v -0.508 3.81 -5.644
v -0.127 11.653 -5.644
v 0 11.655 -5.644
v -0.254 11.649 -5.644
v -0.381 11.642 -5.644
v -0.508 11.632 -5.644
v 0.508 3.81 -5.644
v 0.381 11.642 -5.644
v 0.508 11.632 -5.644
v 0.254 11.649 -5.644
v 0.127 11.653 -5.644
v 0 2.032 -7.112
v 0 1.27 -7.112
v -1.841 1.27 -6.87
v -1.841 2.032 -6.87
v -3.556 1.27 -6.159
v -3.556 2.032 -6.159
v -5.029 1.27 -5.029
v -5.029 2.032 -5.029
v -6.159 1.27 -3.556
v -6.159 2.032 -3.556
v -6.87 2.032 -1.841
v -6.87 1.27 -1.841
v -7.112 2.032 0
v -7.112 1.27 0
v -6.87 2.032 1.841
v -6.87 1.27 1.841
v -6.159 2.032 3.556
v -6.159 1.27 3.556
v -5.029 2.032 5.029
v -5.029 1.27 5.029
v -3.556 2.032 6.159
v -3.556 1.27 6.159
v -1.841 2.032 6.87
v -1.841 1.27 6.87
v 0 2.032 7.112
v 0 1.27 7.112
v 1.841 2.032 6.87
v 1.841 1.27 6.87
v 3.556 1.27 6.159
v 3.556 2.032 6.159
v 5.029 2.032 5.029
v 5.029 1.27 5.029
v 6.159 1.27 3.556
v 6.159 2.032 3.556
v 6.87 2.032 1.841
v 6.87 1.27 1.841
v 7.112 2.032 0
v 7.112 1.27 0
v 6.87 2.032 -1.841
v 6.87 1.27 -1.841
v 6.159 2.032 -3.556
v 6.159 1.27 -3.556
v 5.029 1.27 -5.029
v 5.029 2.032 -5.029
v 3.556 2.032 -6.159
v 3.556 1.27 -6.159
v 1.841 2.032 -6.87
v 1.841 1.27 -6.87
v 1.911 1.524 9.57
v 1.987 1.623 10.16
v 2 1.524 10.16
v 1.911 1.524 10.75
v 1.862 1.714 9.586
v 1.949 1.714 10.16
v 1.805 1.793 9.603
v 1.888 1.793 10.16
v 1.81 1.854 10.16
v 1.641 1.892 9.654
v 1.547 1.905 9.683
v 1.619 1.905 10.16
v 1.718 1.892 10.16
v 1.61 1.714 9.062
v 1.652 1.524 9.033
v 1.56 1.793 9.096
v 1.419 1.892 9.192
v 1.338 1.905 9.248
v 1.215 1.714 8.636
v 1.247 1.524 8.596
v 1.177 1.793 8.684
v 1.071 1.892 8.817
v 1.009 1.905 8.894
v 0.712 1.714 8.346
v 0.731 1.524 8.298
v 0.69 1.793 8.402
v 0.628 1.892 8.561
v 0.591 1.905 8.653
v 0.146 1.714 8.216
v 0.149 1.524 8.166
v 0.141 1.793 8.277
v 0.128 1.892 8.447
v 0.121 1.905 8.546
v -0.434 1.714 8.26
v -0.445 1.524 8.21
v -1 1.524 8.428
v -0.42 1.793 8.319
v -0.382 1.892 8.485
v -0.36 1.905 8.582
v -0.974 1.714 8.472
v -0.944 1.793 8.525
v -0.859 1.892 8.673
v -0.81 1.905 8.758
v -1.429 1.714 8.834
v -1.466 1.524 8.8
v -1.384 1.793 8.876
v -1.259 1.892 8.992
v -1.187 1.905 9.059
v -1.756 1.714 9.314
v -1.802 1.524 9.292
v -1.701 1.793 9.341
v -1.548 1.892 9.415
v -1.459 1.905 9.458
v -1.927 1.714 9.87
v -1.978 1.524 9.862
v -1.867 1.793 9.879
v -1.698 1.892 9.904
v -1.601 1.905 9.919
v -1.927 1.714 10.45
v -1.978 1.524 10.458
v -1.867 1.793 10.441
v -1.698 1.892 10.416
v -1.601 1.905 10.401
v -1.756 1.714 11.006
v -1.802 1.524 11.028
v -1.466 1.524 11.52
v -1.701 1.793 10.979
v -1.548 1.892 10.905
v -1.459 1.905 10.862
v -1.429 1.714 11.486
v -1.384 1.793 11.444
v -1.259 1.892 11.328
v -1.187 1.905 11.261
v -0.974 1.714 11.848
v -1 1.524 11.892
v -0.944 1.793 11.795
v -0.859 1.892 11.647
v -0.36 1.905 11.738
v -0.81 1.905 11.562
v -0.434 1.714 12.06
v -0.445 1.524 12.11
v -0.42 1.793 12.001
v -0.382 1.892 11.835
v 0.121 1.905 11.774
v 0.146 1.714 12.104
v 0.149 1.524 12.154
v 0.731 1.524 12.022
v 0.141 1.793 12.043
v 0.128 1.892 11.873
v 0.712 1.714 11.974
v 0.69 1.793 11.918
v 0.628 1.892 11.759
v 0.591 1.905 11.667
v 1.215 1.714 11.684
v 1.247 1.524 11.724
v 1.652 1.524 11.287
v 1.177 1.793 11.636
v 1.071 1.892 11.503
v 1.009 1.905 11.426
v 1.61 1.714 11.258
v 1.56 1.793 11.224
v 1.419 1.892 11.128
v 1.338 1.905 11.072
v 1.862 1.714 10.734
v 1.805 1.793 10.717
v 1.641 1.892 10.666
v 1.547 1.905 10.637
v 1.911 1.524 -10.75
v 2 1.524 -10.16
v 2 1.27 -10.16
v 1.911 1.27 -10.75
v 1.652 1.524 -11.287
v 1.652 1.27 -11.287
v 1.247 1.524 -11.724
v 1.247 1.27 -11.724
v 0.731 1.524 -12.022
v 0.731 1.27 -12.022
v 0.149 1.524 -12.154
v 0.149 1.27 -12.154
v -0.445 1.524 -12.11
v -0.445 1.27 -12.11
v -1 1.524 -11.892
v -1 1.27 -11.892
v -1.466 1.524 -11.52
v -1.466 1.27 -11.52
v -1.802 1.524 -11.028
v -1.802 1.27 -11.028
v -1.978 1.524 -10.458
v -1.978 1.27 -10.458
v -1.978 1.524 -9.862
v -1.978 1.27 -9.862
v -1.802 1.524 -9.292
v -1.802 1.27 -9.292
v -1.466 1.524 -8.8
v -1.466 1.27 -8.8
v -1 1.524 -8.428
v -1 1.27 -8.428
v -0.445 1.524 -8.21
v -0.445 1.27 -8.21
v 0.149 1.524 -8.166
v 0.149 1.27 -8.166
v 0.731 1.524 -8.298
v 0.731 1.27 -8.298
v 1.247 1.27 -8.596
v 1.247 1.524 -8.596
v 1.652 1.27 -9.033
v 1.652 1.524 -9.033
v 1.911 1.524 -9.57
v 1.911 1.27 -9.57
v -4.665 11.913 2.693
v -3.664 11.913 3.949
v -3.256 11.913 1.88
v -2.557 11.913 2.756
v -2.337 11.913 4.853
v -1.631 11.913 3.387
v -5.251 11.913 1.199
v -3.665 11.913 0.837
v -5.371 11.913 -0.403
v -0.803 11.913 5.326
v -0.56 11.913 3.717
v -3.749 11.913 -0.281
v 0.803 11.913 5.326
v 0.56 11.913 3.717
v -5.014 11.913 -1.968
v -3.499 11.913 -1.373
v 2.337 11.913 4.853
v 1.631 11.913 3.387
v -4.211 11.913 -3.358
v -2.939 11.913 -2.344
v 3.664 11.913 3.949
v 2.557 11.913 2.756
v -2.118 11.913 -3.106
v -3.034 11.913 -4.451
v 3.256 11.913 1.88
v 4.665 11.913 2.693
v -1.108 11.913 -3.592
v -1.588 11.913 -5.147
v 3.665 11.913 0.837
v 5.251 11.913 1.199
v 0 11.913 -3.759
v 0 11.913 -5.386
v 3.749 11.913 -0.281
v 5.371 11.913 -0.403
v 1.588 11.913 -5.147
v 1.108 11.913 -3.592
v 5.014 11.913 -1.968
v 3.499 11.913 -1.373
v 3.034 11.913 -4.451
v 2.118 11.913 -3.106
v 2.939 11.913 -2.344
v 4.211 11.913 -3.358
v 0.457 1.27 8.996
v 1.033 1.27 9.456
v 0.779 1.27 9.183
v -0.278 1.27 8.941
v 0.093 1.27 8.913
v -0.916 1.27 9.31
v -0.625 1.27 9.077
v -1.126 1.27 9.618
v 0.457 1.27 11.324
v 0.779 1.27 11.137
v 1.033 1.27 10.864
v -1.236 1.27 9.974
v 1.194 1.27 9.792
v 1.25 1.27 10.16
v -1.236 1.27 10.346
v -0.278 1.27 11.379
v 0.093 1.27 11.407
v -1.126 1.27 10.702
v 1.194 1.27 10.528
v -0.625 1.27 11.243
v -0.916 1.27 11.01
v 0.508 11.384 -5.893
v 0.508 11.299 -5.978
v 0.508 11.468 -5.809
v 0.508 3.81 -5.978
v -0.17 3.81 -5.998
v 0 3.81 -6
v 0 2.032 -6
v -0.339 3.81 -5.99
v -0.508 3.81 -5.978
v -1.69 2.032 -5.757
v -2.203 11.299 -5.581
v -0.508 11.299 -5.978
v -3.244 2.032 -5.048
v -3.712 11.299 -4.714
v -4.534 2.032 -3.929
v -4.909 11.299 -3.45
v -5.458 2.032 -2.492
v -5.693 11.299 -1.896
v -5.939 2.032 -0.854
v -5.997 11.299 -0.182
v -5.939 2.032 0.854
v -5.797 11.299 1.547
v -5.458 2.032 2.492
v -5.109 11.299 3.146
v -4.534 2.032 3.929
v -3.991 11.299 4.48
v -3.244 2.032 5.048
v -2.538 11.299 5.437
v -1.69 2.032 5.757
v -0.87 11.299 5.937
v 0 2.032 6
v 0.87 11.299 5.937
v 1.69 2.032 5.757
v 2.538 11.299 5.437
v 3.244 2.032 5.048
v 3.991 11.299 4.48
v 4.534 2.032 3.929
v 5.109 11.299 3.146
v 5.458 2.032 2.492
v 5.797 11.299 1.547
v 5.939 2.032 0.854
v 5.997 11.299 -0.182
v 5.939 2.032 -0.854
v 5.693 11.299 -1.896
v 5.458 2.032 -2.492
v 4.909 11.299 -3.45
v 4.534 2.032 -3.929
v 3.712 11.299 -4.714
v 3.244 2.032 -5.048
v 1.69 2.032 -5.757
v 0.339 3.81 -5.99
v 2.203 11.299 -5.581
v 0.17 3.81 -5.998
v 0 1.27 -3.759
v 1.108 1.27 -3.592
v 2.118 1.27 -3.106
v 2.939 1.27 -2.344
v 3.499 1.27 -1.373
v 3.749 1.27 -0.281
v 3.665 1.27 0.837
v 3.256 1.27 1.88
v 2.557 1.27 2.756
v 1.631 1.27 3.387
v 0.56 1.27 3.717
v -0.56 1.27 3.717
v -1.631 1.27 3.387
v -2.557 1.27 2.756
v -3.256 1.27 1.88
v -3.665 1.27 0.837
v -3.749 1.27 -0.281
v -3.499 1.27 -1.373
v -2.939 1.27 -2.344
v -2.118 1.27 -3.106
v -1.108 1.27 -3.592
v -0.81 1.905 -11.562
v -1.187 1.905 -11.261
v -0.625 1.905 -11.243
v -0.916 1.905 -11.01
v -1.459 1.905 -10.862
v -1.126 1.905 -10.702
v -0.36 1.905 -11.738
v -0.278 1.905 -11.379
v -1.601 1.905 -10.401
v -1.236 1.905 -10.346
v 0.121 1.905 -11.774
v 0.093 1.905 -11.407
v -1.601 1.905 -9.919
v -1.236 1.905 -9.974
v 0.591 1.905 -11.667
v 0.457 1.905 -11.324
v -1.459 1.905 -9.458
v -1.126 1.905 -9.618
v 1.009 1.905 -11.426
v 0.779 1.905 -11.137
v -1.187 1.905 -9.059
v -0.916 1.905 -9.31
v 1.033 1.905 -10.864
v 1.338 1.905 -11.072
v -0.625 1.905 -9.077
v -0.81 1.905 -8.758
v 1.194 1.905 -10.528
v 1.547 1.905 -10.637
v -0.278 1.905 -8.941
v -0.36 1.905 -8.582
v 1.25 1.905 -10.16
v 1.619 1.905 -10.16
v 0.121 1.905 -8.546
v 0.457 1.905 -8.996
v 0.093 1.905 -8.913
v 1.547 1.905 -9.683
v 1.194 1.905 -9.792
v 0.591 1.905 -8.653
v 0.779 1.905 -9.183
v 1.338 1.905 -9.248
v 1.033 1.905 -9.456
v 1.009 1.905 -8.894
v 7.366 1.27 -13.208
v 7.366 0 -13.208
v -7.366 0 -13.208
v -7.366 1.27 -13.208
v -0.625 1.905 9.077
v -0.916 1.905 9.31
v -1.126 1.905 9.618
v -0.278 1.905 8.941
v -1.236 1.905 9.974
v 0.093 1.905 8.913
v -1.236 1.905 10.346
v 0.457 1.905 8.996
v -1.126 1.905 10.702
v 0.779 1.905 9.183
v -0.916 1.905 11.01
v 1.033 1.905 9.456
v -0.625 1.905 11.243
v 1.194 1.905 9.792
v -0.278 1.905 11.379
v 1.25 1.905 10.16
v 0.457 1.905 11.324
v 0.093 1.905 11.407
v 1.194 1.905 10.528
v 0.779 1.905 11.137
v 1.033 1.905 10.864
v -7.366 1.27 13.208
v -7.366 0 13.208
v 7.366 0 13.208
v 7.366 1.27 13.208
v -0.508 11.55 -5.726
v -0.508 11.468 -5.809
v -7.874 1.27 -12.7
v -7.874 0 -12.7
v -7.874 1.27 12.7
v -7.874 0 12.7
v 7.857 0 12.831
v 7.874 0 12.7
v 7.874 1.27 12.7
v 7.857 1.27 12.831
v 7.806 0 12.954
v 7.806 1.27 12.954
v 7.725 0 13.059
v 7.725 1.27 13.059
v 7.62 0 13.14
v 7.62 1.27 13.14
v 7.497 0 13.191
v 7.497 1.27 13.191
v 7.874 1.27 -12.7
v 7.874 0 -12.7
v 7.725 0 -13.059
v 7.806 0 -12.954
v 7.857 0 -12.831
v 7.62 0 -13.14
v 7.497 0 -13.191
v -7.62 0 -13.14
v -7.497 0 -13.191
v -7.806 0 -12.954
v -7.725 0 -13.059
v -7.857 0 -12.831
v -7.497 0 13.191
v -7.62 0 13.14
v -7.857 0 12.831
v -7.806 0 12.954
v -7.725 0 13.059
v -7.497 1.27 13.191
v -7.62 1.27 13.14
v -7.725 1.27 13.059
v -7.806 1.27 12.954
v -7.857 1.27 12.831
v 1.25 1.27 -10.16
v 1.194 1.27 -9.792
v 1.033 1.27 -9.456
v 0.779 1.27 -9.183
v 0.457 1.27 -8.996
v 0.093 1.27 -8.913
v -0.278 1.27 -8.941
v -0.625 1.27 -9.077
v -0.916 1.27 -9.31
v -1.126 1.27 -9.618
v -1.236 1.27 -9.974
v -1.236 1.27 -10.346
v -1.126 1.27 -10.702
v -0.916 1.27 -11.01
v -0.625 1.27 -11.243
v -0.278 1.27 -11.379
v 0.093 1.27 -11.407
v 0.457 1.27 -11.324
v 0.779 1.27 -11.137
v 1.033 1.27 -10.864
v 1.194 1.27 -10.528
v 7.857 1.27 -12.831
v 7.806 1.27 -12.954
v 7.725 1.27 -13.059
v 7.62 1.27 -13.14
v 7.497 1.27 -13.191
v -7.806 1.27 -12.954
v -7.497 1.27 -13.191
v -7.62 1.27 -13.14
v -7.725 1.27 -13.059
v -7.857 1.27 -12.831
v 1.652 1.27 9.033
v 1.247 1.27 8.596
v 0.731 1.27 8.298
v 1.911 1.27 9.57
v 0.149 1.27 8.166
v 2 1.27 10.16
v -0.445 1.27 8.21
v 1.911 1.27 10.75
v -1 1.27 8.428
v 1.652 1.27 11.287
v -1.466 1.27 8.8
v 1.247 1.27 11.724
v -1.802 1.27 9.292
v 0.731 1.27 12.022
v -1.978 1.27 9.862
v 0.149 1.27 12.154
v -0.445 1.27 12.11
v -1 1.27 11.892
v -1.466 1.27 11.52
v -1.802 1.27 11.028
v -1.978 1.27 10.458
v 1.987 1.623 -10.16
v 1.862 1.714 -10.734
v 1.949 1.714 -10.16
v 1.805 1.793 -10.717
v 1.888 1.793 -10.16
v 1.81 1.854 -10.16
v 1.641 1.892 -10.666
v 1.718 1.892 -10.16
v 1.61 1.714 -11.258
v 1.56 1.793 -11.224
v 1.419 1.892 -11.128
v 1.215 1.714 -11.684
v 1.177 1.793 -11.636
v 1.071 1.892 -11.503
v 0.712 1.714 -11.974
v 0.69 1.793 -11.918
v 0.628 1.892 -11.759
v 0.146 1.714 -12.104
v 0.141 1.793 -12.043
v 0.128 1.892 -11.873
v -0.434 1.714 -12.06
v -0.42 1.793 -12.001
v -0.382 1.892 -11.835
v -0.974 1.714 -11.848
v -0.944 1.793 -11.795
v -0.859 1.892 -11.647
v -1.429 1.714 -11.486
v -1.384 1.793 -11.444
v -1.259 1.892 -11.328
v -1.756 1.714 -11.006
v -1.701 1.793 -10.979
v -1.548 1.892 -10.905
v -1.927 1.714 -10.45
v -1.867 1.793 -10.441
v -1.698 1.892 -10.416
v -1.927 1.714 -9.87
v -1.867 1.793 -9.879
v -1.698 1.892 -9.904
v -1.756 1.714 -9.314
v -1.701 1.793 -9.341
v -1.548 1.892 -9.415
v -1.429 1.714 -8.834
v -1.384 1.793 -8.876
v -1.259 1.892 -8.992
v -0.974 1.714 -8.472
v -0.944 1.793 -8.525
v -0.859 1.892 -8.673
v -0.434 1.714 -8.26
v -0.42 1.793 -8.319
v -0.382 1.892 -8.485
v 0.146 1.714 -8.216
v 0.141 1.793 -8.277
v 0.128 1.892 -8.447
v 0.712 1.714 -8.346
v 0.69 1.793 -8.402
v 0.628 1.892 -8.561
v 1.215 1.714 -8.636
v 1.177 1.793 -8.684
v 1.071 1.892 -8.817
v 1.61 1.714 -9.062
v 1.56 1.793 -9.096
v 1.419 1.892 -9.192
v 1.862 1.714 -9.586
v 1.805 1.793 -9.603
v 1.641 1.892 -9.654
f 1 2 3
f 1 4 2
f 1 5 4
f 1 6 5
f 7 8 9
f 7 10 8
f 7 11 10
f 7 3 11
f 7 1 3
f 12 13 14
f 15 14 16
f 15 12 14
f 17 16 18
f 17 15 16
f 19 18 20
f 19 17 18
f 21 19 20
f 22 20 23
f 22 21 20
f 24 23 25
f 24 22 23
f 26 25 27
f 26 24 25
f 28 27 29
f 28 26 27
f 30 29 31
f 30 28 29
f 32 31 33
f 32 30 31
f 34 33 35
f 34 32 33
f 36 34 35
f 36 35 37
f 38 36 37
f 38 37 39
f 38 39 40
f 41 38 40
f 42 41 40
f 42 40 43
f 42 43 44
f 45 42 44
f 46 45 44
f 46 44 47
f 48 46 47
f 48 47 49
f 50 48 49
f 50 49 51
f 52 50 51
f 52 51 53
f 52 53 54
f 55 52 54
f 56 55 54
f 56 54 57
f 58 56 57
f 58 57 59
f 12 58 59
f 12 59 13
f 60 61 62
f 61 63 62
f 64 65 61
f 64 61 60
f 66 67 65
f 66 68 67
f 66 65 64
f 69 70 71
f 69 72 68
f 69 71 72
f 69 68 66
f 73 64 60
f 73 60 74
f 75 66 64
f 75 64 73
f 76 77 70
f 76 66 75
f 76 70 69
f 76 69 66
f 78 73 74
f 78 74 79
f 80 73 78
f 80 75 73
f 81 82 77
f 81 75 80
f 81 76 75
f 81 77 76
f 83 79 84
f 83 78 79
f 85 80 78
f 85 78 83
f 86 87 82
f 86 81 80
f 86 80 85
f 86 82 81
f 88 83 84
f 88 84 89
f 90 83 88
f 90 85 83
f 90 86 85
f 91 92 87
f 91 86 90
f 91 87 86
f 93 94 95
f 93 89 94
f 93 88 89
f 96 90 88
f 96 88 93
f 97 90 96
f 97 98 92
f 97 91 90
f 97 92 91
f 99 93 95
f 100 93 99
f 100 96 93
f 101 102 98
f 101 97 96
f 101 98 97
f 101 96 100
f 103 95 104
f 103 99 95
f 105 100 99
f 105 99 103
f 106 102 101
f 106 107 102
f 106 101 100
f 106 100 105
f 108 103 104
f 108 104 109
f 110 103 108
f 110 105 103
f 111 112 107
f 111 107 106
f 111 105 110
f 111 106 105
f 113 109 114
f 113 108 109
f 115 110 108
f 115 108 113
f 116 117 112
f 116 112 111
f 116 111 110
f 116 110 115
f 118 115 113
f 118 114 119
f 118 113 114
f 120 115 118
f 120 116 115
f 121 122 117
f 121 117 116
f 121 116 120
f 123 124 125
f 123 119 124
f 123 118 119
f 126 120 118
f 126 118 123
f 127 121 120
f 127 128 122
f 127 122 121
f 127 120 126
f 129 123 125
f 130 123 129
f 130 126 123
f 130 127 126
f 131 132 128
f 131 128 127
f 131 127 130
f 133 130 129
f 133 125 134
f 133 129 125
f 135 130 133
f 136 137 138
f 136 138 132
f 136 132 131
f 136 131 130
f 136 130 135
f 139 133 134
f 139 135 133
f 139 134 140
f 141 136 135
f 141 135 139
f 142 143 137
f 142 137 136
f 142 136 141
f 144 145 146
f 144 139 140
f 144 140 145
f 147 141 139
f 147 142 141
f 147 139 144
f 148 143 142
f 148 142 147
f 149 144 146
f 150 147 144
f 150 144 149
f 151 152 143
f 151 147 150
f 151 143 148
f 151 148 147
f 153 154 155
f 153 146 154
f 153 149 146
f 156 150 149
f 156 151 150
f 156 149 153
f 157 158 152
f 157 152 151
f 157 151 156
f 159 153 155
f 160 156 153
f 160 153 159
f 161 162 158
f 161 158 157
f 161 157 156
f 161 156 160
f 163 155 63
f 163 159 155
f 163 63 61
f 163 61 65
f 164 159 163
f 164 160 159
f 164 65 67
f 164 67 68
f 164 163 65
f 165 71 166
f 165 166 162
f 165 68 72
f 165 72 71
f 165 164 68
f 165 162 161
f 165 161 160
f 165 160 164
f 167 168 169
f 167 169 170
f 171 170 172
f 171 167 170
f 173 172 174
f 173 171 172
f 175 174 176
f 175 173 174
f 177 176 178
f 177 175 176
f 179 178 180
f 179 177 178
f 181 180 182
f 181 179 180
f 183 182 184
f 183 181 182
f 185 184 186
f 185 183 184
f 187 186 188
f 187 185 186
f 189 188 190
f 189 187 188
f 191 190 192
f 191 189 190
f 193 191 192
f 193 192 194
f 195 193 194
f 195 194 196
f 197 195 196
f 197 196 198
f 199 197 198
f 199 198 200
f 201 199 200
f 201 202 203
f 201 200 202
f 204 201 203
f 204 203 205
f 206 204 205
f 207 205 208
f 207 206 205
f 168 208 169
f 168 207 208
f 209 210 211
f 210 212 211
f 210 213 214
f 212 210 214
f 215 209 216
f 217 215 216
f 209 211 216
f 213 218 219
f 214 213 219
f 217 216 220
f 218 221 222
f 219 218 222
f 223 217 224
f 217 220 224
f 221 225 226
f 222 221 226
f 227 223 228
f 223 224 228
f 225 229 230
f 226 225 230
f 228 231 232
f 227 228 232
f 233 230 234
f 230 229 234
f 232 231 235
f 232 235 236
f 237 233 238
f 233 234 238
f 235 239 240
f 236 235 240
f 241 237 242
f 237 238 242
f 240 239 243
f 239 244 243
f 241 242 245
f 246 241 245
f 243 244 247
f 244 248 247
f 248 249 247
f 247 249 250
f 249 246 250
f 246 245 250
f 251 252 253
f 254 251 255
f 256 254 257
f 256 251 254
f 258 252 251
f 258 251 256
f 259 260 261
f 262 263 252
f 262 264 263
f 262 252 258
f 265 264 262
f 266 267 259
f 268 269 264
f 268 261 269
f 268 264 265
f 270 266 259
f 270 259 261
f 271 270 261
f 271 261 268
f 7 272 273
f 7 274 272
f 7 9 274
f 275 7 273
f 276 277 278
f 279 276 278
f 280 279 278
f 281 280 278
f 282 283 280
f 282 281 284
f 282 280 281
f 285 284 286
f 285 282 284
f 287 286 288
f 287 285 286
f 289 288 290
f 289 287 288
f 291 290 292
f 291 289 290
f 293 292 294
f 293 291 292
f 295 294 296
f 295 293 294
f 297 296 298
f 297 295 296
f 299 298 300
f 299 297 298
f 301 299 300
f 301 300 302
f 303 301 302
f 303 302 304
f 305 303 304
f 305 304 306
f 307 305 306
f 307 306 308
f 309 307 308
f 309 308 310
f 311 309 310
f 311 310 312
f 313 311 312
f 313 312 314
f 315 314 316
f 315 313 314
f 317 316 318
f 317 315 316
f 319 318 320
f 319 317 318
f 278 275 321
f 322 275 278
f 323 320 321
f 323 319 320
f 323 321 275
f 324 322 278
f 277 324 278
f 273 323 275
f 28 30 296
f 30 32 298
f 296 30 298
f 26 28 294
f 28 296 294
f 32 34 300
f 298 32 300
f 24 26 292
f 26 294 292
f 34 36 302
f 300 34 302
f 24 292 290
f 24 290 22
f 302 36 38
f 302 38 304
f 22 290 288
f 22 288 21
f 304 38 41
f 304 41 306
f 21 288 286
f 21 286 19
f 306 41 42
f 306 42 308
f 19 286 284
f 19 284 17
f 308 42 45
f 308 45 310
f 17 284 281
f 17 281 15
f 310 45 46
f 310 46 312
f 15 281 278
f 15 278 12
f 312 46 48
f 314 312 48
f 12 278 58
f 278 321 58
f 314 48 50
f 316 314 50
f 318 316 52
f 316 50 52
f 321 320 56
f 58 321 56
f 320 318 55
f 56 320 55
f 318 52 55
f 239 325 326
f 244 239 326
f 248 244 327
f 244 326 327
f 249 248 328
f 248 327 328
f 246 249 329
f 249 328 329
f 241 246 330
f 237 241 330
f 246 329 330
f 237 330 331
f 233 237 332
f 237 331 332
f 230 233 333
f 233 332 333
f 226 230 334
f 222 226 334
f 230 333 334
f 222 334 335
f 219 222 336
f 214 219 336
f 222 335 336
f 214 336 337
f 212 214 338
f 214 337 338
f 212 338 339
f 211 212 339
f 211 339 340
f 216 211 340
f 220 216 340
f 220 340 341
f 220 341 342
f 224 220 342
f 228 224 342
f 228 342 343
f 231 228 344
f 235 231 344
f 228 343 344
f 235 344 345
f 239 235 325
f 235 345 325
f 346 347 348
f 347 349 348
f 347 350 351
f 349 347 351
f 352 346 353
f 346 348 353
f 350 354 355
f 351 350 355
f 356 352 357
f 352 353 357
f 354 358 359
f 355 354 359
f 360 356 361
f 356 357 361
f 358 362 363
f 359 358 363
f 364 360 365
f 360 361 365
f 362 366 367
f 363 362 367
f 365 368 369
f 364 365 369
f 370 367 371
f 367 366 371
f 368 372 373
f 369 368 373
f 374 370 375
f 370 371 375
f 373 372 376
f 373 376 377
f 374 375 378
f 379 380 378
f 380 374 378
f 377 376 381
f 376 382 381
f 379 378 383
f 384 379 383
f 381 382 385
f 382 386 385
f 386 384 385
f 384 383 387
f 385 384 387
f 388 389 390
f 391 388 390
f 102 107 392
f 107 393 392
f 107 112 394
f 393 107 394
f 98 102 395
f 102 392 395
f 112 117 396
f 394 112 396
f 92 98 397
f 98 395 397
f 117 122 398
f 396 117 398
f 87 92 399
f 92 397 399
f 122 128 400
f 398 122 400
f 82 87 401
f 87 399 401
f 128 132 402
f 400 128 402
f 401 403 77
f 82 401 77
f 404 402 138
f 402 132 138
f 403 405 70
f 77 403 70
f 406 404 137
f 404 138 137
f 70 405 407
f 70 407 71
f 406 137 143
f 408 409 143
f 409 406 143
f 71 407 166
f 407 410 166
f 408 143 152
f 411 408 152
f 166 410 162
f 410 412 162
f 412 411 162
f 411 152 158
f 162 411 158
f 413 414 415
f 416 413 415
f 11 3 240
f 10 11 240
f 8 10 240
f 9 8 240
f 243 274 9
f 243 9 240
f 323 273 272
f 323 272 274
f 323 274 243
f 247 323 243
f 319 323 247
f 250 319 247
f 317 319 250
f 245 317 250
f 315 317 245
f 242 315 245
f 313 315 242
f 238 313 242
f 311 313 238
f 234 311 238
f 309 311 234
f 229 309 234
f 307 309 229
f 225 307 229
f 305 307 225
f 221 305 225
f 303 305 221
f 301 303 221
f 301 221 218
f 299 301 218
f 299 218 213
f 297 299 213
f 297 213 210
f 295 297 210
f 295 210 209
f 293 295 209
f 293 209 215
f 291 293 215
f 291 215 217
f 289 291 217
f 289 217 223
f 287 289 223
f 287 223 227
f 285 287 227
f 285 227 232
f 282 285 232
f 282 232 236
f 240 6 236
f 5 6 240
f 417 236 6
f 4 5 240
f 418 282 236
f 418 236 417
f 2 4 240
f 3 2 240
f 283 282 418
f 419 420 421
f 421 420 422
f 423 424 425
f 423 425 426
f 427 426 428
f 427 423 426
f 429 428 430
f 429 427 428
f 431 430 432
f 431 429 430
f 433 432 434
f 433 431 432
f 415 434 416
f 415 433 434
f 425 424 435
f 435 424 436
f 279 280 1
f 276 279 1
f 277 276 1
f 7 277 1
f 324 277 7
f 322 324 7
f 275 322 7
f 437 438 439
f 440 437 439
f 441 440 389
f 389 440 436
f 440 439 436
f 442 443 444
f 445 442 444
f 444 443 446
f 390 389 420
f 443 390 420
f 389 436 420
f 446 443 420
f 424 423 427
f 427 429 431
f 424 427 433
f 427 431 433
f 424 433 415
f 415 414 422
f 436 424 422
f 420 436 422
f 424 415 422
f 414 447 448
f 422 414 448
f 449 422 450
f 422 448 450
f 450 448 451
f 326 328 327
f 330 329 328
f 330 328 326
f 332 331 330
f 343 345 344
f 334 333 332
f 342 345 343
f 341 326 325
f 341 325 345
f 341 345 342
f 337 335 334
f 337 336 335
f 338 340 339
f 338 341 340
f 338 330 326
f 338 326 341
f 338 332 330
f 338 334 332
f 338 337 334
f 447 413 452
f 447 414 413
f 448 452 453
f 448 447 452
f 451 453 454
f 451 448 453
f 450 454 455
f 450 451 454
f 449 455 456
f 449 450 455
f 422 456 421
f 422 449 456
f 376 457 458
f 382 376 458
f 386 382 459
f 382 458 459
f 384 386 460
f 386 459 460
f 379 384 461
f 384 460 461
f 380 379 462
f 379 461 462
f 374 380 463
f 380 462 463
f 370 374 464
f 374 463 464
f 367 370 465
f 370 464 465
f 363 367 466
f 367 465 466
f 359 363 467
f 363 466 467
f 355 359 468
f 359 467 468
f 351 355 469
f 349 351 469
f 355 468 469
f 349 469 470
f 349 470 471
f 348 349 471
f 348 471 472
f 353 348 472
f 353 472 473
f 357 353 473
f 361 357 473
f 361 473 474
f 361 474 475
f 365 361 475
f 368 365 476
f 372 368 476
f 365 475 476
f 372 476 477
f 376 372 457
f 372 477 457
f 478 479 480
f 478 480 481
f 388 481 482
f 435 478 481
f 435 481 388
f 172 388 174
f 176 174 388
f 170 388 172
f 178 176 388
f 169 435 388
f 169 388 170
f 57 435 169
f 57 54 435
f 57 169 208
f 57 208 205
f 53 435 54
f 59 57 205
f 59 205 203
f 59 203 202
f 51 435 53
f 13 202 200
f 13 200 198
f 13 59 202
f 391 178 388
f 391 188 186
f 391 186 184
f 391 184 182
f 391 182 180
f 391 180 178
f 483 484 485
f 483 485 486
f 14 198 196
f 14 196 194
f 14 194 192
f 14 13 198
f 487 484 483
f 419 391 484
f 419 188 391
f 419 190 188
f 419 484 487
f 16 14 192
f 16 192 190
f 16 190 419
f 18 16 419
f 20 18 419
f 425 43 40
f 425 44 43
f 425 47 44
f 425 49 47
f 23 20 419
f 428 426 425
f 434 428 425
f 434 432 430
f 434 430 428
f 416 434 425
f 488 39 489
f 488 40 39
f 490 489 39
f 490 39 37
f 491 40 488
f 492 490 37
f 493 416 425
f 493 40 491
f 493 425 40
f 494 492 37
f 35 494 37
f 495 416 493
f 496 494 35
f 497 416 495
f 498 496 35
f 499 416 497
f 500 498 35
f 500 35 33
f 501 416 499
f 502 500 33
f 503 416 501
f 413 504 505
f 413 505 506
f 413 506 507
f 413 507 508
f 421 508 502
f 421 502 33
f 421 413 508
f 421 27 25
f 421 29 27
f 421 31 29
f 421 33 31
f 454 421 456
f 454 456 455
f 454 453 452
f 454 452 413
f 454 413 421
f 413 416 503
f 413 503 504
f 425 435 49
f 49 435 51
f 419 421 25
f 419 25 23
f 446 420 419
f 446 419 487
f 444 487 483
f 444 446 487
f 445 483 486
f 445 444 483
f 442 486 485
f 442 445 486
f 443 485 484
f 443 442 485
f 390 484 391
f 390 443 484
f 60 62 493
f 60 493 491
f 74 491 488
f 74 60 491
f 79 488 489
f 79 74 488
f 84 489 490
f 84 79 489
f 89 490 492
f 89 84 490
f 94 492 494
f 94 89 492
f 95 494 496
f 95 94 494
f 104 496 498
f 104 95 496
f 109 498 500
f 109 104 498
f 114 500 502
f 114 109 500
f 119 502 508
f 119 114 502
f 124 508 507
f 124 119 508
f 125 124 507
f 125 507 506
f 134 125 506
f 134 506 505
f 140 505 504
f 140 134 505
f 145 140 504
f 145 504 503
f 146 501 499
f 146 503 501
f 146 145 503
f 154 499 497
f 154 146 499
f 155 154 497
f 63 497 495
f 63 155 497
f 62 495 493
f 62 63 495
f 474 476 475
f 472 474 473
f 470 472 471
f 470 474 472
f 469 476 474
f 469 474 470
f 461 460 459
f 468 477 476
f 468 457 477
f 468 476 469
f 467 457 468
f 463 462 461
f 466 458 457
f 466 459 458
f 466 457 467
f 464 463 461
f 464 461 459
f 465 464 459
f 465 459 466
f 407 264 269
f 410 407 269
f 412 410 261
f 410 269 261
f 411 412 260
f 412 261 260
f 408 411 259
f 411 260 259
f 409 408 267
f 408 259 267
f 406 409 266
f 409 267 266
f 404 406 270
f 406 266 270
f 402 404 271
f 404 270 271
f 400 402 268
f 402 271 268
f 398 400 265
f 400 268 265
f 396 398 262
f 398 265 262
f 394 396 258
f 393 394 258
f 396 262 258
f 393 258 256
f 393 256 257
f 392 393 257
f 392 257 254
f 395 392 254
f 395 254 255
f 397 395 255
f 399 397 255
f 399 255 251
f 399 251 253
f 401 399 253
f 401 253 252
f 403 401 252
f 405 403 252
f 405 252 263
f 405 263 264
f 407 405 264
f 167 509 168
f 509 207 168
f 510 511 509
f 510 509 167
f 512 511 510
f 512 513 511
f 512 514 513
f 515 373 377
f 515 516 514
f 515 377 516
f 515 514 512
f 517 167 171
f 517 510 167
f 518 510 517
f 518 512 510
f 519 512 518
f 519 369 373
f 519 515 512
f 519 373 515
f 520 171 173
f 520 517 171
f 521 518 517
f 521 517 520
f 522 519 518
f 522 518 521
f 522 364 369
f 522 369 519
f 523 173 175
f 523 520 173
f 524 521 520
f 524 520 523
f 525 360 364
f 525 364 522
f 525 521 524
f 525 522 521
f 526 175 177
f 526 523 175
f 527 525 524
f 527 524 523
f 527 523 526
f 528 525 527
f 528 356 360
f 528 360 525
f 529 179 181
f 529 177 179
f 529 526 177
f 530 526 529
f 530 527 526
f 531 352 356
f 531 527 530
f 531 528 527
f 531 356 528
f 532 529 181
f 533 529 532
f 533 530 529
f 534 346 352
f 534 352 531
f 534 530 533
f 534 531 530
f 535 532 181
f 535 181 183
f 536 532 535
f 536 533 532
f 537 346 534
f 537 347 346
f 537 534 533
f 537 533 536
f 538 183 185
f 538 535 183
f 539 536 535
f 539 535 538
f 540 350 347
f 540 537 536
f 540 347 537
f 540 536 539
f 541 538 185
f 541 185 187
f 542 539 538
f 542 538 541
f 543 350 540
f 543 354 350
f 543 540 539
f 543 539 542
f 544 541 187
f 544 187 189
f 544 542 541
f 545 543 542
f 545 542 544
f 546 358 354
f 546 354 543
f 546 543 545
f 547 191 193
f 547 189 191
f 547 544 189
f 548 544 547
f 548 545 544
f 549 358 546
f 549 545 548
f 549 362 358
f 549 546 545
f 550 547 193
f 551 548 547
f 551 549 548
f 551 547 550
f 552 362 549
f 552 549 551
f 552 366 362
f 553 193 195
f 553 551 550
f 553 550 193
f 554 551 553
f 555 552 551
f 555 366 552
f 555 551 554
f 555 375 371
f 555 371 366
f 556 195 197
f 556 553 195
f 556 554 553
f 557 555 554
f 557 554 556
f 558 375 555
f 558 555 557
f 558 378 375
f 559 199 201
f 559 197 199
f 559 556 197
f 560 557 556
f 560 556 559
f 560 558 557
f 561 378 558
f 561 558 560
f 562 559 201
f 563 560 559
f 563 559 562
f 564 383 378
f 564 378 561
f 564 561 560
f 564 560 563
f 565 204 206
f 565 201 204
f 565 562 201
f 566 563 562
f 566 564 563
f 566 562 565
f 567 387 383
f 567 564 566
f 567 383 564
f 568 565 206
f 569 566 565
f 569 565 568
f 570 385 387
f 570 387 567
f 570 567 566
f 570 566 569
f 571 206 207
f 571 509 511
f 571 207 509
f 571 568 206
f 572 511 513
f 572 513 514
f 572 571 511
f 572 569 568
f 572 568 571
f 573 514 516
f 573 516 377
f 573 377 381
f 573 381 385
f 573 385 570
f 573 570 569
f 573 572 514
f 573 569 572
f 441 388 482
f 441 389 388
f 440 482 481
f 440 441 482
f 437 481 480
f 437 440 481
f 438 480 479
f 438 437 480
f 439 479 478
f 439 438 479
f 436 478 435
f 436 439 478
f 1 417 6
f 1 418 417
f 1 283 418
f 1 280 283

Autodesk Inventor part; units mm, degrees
sketch "Sketch_1" plane through (0, 0, 0) normal (0, 1, 0) x (-1, 0, 0)
  line L0 (7.874, -12.7) -> (7.874, 12.7)
  arc A0 (7.874, 12.7) -> (7.366, 13.208) centre (7.366, 12.7) ccw
  line L1 (7.366, 13.208) -> (-7.366, 13.208)
  arc A1 (-7.366, 13.208) -> (-7.874, 12.7) centre (-7.366, 12.7) ccw
  line L2 (-7.874, 12.7) -> (-7.874, -12.7)
  arc A2 (-7.874, -12.7) -> (-7.366, -13.208) centre (-7.366, -12.7) ccw
  line L3 (-7.366, -13.208) -> (7.366, -13.208)
  arc A3 (7.366, -13.208) -> (7.874, -12.7) centre (7.366, -12.7) ccw
extrude "Extrusion1" add sketch "Sketch_1" along normal blind 1.27
sketch "Sketch_4" plane through (0, 0, 0) normal (1, 0, 0) x (0, 1, 0)
  line L0 (0.762, 0) -> (11.9126, 0)
  line L1 (11.9126, -3.7592) -> (0.762, -3.7592)
  line L2 (0.762, -3.7592) -> (0.762, -7.112)
  line L3 (0.762, -7.112) -> (2.032, -7.112)
  line L4 (2.032, -7.112) -> (2.032, -6)
  line L5 (2.032, -6) -> (11.2991, -6)
  line L6 (11.2991, -6) -> (11.9126, -5.3865)
  line L7 (11.9126, -5.3865) -> (11.9126, -3.7592)
revolve "Revolution1" add sketch "Sketch_4" angle 360 about axis through (0, 0.762, 0) along (0, -1, 0)
thread "Thread1" size "M12x1" class "6g" standard "ISO Metric profile" full length
sketch "Sketch_6" plane through (0, 3.81, 0) normal (0, 1, 0) x (1, 0, 0)
  line L0 (-0.508, 5.6444) -> (0.508, 5.6444)
  line L1 (0.508, 5.6444) -> (0.508, 6.4064)
  line L2 (0.508, 6.4064) -> (-0.508, 6.4064)
  line L3 (-0.508, 6.4064) -> (-0.508, 5.6444)
extrude "Extrusion2" cut sketch "Sketch_6" along normal blind 25.4
sketch "Sketch_2" plane through (0, 0, -10.16) normal (0, 0, 1) x (1, 0, 0)
  line L0 (0, 1.27) -> (0, 1.905)
  line L1 (1.25, 1.27) -> (2, 1.27)
  line L2 (2, 1.27) -> (2, 1.524)
  arc A0 (2, 1.524) -> (1.619, 1.905) centre (1.619, 1.524) ccw
  line L3 (1.619, 1.905) -> (1.25, 1.905)
  line L4 (1.25, 1.905) -> (1.25, 1.27)
revolve "Revolution2" add sketch "Sketch_2" angle 360 about axis through (0, 1.27, -10.16) along (0, -1, 0)
sketch "Sketch_3" plane through (0, 0, 10.16) normal (0, 0, 1) x (1, 0, 0)
  line L0 (0, 1.27) -> (0, 1.905)
  line L1 (1.25, 1.27) -> (2, 1.27)
  line L2 (2, 1.27) -> (2, 1.524)
  arc A0 (2, 1.524) -> (1.619, 1.905) centre (1.619, 1.524) ccw
  line L3 (1.619, 1.905) -> (1.25, 1.905)
  line L4 (1.25, 1.905) -> (1.25, 1.27)
revolve "Revolution3" add sketch "Sketch_3" angle 360 about axis through (0, 1.27, 10.16) along (0, -1, 0)
ref_plane "hex_face_nut_XY" through (0, 2.032, 0) normal (0, 1, 0) x (1, 0, 0)
ref_plane "hex_face_nut_YZ" through (0, 2.032, 0) normal (1, 0, 0) x (0, 0, -1)
ref_plane "hex_face_nut_ZX" through (0, 2.032, 0) normal (0, 0, -1) x (0, 1, 0)
ref_plane "knurled_nut_XY" through (0, 4.5466, 0) normal (0, 1, 0) x (1, 0, 0)
ref_plane "knurled_nut_YZ" through (0, 4.5466, 0) normal (1, 0, 0) x (0, 0, -1)
ref_plane "knurled_nut_ZX" through (0, 4.5466, 0) normal (0, 0, -1) x (0, 1, 0)
ref_plane "lockwasher_XY" through (0, 4.0386, 0) normal (0, 1, 0) x (1, 0, 0)
ref_plane "lockwasher_YZ" through (0, 4.0386, 0) normal (1, 0, 0) x (0, 0, -1)
ref_plane "lockwasher_ZX" through (0, 4.0386, 0) normal (0, 0, -1) x (0, 1, 0)
ref_plane "panel_XY" through (0, 0, 0) normal (0, -1, 0) x (1, 0, 0)
ref_plane "panel_YZ" through (0, 0, 0) normal (1, 0, 0) x (0, 0, 1)
ref_plane "panel_ZX" through (0, 0, 0) normal (0, 0, 1) x (0, -1, 0)
ref_plane "toggle_XY" through (0, 9.4107, 0) normal (0, 1, 0) x (1, 0, 0)
ref_plane "toggle_YZ" through (0, 9.4107, 0) normal (1, 0, 0) x (0, 0, -1)
ref_plane "toggle_ZX" through (0, 9.4107, 0) normal (0, 0, -1) x (0, 1, 0)
properties part number "SS114-panel"
